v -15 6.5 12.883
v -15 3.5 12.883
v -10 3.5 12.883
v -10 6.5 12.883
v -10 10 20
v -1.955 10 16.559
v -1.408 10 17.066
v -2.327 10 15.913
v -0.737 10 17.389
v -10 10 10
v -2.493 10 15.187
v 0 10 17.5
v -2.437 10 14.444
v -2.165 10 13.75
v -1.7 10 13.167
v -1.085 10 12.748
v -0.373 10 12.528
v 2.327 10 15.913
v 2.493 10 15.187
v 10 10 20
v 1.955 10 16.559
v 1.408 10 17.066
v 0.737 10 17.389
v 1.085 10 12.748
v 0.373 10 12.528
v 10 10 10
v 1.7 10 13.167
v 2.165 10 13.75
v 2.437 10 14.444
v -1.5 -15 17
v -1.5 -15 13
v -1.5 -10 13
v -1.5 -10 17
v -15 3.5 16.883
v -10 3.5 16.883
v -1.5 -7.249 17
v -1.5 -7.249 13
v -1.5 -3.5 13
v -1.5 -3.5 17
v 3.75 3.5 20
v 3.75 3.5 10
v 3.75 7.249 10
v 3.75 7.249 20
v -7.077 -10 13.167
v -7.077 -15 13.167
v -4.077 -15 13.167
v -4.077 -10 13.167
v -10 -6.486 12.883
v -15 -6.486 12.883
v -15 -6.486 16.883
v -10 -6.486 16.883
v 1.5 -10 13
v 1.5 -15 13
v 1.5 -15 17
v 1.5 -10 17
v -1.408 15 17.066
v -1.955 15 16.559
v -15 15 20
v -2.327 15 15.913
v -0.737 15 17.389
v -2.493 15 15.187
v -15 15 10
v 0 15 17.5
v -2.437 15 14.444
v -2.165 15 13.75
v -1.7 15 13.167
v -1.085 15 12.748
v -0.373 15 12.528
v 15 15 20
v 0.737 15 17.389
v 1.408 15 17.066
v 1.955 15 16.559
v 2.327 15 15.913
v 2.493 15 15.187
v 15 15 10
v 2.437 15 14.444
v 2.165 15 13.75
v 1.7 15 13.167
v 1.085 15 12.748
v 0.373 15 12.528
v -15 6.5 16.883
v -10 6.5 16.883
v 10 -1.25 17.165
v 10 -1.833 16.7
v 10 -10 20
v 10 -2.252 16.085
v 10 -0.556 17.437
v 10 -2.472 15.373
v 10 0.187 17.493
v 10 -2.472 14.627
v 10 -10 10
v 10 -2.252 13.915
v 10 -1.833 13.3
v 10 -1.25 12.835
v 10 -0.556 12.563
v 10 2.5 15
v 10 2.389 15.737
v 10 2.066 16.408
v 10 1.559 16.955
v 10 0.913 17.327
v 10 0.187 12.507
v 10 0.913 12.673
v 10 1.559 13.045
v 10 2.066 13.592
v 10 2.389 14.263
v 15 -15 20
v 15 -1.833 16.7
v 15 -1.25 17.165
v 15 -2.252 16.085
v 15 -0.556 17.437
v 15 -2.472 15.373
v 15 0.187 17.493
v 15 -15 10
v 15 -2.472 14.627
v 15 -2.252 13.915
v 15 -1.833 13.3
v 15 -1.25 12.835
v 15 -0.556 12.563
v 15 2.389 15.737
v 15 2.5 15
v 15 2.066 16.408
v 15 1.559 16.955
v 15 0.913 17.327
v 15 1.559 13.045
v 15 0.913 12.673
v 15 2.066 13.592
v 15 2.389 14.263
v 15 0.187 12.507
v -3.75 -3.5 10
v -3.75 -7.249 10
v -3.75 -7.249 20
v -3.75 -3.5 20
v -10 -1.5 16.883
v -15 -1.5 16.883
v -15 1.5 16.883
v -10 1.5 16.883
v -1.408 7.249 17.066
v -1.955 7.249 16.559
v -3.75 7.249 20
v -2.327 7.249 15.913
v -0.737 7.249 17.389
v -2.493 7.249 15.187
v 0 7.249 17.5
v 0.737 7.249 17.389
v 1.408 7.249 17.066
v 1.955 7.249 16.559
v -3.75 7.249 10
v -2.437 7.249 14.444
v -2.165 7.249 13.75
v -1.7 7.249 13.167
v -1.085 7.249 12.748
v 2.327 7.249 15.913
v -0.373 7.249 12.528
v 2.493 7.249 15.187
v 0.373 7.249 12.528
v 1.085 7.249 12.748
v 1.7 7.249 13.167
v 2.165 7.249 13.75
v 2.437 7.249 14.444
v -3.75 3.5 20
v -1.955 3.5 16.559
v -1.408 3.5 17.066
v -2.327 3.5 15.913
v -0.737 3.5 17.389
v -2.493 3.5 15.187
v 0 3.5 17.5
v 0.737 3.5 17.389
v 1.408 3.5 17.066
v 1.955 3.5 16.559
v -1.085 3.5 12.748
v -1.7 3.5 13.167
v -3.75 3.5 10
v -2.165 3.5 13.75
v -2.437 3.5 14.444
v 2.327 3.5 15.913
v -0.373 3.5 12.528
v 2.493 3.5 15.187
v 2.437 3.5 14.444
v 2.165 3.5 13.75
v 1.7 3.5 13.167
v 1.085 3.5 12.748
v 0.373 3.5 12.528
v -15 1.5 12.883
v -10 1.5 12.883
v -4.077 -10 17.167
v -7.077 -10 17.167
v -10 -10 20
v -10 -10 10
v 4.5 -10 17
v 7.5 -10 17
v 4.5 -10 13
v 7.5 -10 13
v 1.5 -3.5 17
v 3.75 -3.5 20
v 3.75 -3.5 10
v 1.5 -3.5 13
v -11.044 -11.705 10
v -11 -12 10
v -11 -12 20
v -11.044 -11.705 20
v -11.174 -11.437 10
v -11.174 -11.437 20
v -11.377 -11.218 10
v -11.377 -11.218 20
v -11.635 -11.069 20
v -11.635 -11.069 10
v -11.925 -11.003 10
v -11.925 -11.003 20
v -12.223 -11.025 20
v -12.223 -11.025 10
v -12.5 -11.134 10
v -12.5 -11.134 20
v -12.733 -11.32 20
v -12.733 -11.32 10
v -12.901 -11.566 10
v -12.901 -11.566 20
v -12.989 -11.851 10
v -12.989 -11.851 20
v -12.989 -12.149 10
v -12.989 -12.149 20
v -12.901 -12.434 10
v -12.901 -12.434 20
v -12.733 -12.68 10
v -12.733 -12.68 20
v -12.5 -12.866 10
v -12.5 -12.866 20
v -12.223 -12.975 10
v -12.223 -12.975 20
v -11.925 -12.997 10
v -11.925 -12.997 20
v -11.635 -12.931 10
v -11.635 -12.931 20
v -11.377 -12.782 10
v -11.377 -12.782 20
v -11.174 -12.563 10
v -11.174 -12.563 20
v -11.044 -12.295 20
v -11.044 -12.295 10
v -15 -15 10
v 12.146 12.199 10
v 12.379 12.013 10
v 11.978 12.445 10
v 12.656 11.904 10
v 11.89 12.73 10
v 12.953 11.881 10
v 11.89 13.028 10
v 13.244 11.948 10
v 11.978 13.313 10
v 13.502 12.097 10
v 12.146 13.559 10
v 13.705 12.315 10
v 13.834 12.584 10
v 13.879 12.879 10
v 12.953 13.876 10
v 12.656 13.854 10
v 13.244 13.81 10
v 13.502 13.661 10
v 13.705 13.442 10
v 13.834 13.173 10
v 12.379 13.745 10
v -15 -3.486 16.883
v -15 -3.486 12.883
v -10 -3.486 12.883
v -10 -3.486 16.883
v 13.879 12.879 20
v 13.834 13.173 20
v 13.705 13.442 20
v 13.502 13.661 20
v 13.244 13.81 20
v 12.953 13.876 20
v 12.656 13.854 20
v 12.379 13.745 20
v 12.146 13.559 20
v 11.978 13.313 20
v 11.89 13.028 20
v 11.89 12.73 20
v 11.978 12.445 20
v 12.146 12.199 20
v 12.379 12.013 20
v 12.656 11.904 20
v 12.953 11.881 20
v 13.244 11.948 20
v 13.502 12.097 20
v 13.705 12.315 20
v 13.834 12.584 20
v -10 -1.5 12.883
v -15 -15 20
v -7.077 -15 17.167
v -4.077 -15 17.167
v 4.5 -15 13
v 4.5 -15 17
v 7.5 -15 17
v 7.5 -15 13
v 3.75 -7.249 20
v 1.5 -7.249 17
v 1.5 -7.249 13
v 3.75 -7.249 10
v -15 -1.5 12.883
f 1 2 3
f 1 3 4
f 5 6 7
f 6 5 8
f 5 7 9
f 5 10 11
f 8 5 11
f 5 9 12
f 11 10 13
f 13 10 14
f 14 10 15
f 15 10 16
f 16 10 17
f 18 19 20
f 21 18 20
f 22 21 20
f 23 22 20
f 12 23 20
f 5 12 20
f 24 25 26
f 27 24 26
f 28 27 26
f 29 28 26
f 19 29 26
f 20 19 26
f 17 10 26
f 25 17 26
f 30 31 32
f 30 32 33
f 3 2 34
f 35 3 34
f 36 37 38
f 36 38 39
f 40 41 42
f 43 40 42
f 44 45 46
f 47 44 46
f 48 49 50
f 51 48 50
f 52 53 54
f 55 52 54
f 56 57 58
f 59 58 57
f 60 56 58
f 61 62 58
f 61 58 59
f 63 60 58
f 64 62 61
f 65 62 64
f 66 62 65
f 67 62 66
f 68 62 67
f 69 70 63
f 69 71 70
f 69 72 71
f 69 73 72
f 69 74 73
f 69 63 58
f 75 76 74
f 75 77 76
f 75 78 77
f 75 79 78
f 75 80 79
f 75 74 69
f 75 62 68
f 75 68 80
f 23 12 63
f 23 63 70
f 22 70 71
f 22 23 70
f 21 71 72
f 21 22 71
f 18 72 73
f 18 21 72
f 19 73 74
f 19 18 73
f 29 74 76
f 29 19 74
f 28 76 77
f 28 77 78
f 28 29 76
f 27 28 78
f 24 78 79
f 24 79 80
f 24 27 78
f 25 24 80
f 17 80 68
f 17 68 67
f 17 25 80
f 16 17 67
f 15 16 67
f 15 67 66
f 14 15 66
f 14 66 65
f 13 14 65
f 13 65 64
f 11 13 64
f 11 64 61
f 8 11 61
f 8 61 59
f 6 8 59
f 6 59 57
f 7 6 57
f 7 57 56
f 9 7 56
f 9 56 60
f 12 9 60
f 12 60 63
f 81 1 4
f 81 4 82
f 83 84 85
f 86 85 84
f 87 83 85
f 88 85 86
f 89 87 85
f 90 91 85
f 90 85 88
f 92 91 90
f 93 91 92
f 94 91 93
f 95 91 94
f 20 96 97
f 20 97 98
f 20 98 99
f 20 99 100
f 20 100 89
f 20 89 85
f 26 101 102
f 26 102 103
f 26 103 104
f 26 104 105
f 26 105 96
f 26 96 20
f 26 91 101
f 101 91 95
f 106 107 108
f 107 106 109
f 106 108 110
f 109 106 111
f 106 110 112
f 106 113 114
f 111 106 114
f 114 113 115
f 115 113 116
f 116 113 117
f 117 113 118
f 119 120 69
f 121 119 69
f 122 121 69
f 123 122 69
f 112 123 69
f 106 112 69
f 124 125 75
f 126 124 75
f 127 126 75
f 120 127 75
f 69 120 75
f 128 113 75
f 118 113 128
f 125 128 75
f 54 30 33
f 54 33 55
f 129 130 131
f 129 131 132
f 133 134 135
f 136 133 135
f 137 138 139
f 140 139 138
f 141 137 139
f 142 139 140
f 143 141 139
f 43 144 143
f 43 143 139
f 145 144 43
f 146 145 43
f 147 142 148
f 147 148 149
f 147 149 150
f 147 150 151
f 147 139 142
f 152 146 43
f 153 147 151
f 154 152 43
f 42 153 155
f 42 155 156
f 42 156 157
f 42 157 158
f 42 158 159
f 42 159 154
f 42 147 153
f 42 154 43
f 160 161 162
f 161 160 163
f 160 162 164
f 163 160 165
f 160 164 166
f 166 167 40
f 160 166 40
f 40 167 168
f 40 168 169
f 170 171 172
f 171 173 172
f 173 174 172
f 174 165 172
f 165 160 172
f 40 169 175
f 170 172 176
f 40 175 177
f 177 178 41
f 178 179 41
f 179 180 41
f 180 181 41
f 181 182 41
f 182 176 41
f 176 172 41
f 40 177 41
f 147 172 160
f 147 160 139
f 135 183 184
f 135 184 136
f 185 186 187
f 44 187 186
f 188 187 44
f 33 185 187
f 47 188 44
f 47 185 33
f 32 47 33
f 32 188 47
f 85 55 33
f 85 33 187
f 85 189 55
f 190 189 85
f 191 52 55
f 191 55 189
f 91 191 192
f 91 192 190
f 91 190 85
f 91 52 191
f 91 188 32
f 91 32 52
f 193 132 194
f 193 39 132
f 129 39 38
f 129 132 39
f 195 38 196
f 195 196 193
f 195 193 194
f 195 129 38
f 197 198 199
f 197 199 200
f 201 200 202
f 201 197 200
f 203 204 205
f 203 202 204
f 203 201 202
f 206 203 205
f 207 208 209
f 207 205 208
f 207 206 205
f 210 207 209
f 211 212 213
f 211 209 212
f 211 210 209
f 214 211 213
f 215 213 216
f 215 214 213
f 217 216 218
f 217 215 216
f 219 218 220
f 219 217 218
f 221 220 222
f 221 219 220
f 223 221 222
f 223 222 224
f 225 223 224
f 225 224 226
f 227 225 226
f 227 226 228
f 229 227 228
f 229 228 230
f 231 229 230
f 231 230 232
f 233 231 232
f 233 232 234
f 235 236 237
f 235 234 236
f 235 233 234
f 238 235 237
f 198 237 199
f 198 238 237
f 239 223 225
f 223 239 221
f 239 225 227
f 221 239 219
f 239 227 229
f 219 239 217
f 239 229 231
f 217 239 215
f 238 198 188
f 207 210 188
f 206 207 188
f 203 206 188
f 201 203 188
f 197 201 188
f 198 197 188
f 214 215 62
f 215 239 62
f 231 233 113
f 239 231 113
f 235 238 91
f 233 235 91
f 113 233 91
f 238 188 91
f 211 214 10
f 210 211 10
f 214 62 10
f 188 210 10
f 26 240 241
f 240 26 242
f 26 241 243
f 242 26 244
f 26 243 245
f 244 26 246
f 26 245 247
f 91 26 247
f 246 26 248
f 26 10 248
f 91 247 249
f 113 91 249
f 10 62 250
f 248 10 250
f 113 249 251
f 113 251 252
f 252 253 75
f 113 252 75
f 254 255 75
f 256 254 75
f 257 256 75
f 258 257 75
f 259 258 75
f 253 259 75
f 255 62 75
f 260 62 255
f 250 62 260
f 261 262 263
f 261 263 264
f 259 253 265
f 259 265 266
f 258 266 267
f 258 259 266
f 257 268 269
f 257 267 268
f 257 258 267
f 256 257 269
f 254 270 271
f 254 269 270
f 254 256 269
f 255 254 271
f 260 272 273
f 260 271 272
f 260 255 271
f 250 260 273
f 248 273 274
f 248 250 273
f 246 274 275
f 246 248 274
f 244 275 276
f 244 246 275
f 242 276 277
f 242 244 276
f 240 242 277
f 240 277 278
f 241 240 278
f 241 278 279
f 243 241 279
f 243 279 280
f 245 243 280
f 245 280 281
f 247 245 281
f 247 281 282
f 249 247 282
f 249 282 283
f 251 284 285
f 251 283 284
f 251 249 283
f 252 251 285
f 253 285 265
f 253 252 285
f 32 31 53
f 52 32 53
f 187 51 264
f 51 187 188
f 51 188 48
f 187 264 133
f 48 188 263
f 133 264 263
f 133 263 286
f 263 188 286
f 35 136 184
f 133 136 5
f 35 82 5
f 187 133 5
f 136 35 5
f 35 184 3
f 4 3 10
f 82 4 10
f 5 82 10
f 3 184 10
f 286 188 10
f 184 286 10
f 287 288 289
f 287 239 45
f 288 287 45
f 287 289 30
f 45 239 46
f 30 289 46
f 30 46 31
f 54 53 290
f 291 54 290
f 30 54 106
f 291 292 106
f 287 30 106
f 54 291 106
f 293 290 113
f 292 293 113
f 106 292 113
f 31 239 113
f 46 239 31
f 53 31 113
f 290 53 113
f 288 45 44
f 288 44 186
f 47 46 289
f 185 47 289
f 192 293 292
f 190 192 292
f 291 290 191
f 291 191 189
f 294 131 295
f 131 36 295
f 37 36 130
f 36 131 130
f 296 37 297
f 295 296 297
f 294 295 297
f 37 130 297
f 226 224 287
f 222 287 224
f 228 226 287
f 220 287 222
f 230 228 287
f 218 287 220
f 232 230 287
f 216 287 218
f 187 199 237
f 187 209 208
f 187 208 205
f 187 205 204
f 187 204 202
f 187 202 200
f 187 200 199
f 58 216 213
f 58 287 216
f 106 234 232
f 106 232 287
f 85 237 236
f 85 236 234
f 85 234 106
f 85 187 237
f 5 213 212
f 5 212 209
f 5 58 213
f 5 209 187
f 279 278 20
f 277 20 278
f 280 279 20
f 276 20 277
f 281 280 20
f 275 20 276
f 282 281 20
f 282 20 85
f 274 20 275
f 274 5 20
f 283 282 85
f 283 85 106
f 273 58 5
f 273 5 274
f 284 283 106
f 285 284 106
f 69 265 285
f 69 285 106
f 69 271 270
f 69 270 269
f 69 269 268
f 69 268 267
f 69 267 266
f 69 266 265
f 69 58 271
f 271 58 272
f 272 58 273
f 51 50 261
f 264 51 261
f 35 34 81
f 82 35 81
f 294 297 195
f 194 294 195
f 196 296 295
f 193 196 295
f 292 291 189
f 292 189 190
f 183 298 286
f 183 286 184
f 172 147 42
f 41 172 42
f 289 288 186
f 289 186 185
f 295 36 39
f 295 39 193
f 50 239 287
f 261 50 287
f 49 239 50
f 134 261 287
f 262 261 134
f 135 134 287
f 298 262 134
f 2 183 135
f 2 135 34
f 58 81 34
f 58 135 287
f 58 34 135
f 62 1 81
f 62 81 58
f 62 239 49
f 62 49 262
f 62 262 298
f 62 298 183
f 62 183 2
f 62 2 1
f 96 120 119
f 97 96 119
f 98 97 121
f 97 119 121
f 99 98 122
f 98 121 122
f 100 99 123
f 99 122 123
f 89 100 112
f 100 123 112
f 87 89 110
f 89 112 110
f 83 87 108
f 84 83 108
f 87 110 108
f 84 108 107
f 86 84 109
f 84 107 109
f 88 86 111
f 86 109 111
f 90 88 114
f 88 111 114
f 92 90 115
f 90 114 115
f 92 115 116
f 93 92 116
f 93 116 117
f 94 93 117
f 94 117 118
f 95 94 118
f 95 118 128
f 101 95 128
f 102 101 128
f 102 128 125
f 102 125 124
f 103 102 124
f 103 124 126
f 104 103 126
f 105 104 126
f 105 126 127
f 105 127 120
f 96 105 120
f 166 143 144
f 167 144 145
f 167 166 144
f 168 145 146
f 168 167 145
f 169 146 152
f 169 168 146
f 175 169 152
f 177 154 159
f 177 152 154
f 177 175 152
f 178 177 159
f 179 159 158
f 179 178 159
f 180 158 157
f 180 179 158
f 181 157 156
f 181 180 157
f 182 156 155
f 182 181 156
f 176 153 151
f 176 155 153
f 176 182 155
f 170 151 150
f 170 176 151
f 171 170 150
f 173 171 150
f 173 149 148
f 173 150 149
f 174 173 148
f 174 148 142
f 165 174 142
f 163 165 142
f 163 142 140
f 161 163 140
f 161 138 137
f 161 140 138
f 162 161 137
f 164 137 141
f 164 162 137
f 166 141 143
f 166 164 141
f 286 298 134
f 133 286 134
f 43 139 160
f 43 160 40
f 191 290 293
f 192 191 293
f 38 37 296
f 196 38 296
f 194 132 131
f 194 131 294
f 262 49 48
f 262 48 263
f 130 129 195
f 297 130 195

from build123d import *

# Parameters (mm, degrees)
SKETCH1_W             = 30
SKETCH1_H             = 30
BOSS_EXTRUDE1_DEPTH   = 10
SKETCH2_W             = 30
SKETCH2_H             = 30
SKETCH2_W_2           = 20
SKETCH2_H_2           = 20
BOSS_EXTRUDE2_DEPTH   = 10
SKETCH2_W_3           = 7.5
SKETCH2_H_3           = 3.748828889
BOSS_EXTRUDE2_2_DEPTH = 10
BOSS_EXTRUDE2_3_DEPTH = 10
SKETCH3_W             = 30
SKETCH3_H             = 30
BOSS_EXTRUDE3_DEPTH   = 10
SKETCH4_R             = 3.1
CUT_EXTRUDE1_DEPTH    = 10
SKETCH5_R             = 3.1
CUT_EXTRUDE2_DEPTH    = 10
CUT_EXTRUDE3_START    = -30
SKETCH8_R             = 1
CUT_EXTRUDE3_DEPTH    = 30
CUT_EXTRUDE5_START    = -11.5
SKETCH9_R             = 2.5
CUT_EXTRUDE5_DEPTH    = 11.5
SKETCH10_R            = 2.5
CUT_EXTRUDE6_DEPTH    = 10
SKETCH11_W            = 4
SKETCH11_H            = 3
CUT_EXTRUDE7_DEPTH    = 9
SKETCH13_W            = 3
SKETCH13_H            = 4
CUT_EXTRUDE9_DEPTH    = 13


with BuildPart() as part:
    # Sketch1 → Boss-Extrude1 (new body)
    with BuildSketch(Plane.XY):
        Rectangle(SKETCH1_W, SKETCH1_H)
    extrude(amount=BOSS_EXTRUDE1_DEPTH)

    # Sketch5 → Cut-Extrude2 (cut)
    with BuildSketch(Plane(origin=(0, 0, 0), x_dir=(-1, 0, 0), z_dir=(0, 0, -1))):
        with Locations((-6, -0.372899474)):
            Circle(SKETCH5_R)
    extrude(amount=-CUT_EXTRUDE2_DEPTH, mode=Mode.SUBTRACT)


with BuildPart() as body_2:
    # Sketch2 → Boss-Extrude2 (new body)
    with BuildSketch(Plane.XY.offset(10)):
        Rectangle(SKETCH2_W, SKETCH2_H)
        Rectangle(SKETCH2_W_2, SKETCH2_H_2, mode=Mode.SUBTRACT)
    extrude(amount=BOSS_EXTRUDE2_DEPTH)


with BuildPart() as body_3:
    # Sketch2 → Boss-Extrude2 2 (new body)
    with BuildSketch(Plane.XY.offset(10)):
        with Locations((0, 5.374414445)):
            Rectangle(SKETCH2_W_3, SKETCH2_H_3)
    extrude(amount=BOSS_EXTRUDE2_2_DEPTH)


with BuildPart() as body_4:
    # Sketch2 → Boss-Extrude2 3 (new body)
    with BuildSketch(Plane.XY.offset(10)):
        with Locations((0, -5.374414445)):
            Rectangle(SKETCH2_W_3, SKETCH2_H_3)
    extrude(amount=BOSS_EXTRUDE2_3_DEPTH)


with BuildPart() as body_5:
    # Sketch3 → Boss-Extrude3 (new body)
    with BuildSketch(Plane.XY.offset(20)):
        Rectangle(SKETCH3_W, SKETCH3_H)
    extrude(amount=BOSS_EXTRUDE3_DEPTH)

    # Sketch4 → Cut-Extrude1 (cut)
    with BuildSketch(Plane.XY.offset(30)):
        with Locations((-6, 0)):
            Circle(SKETCH4_R)
    extrude(amount=-CUT_EXTRUDE1_DEPTH, mode=Mode.SUBTRACT)


with BuildPart() as cut_extrude3_tool:
    # Sketch8 → Cut-Extrude3 (new body)
    with BuildSketch(Plane.XY.offset(30).offset(CUT_EXTRUDE3_START)):
        with Locations((-12, -12)):
            Circle(SKETCH8_R)
        with Locations((12.878679656, 12.878679656)):
            Circle(SKETCH8_R)
    extrude(amount=CUT_EXTRUDE3_DEPTH)


with BuildPart() as part_1:
    add(part.part)

    # Cut-Extrude3: cut by cut_extrude3_tool
    add(cut_extrude3_tool.part, mode=Mode.SUBTRACT)


with BuildPart() as body_2_1:
    add(body_2.part)

    # Cut-Extrude3: cut by cut_extrude3_tool
    add(cut_extrude3_tool.part, mode=Mode.SUBTRACT)


with BuildPart() as body_5_1:
    add(body_5.part)

    # Cut-Extrude3: cut by cut_extrude3_tool
    add(cut_extrude3_tool.part, mode=Mode.SUBTRACT)


with BuildPart() as cut_extrude5_tool:
    # Sketch9 → Cut-Extrude5 (new body)
    with BuildSketch(Plane(origin=(0, 15, 0), x_dir=(1, 0, 0), z_dir=(0, 1, 0)).offset(CUT_EXTRUDE5_START)):
        with Locations(Location((0, -15, 0), (0, 0, 270))):
            Circle(SKETCH9_R)
    extrude(amount=CUT_EXTRUDE5_DEPTH)


with BuildPart() as body_2_2:
    add(body_2_1.part)

    # Cut-Extrude5: cut by cut_extrude5_tool
    add(cut_extrude5_tool.part, mode=Mode.SUBTRACT)

    # Sketch10 → Cut-Extrude6 (cut)
    with BuildSketch(Plane(origin=(15, 0, 0), x_dir=(0, 0, -1), z_dir=(1, 0, 0))):
        with Locations(Location((-15, 0, 0), (0, 0, 90))):
            Circle(SKETCH10_R)
    extrude(amount=-CUT_EXTRUDE6_DEPTH, mode=Mode.SUBTRACT)

    # Sketch11 → Cut-Extrude7 (cut)
    with BuildSketch(Plane.ZY.offset(15)):
        with Locations((14.883452823, 5)):
            Rectangle(SKETCH11_W, SKETCH11_H)
        with Locations((14.883452823, 0)):
            Rectangle(SKETCH11_W, SKETCH11_H)
        with Locations((14.883452823, -4.985769597)):
            Rectangle(SKETCH11_W, SKETCH11_H)
    extrude(amount=-CUT_EXTRUDE7_DEPTH, mode=Mode.SUBTRACT)


with BuildPart() as body_3_1:
    add(body_3.part)

    # Cut-Extrude5: cut by cut_extrude5_tool
    add(cut_extrude5_tool.part, mode=Mode.SUBTRACT)


with BuildPart() as cut_extrude9_tool:
    # Sketch13 → Cut-Extrude9 (new body)
    with BuildSketch(Plane.XZ.offset(15)):
        with Locations((0, 15)):
            Rectangle(SKETCH13_W, SKETCH13_H)
        with Locations((6, 15)):
            Rectangle(SKETCH13_W, SKETCH13_H)
        with Locations((-5.576653418, 15.166702073)):
            Rectangle(SKETCH13_W, SKETCH13_H)
    extrude(amount=-CUT_EXTRUDE9_DEPTH)


with BuildPart() as body_2_3:
    add(body_2_2.part)

    # Cut-Extrude9: cut by cut_extrude9_tool
    add(cut_extrude9_tool.part, mode=Mode.SUBTRACT)


with BuildPart() as body_4_1:
    add(body_4.part)

    # Cut-Extrude9: cut by cut_extrude9_tool
    add(cut_extrude9_tool.part, mode=Mode.SUBTRACT)


solid = Compound([body_3_1.part, body_2_3.part, body_4_1.part])
